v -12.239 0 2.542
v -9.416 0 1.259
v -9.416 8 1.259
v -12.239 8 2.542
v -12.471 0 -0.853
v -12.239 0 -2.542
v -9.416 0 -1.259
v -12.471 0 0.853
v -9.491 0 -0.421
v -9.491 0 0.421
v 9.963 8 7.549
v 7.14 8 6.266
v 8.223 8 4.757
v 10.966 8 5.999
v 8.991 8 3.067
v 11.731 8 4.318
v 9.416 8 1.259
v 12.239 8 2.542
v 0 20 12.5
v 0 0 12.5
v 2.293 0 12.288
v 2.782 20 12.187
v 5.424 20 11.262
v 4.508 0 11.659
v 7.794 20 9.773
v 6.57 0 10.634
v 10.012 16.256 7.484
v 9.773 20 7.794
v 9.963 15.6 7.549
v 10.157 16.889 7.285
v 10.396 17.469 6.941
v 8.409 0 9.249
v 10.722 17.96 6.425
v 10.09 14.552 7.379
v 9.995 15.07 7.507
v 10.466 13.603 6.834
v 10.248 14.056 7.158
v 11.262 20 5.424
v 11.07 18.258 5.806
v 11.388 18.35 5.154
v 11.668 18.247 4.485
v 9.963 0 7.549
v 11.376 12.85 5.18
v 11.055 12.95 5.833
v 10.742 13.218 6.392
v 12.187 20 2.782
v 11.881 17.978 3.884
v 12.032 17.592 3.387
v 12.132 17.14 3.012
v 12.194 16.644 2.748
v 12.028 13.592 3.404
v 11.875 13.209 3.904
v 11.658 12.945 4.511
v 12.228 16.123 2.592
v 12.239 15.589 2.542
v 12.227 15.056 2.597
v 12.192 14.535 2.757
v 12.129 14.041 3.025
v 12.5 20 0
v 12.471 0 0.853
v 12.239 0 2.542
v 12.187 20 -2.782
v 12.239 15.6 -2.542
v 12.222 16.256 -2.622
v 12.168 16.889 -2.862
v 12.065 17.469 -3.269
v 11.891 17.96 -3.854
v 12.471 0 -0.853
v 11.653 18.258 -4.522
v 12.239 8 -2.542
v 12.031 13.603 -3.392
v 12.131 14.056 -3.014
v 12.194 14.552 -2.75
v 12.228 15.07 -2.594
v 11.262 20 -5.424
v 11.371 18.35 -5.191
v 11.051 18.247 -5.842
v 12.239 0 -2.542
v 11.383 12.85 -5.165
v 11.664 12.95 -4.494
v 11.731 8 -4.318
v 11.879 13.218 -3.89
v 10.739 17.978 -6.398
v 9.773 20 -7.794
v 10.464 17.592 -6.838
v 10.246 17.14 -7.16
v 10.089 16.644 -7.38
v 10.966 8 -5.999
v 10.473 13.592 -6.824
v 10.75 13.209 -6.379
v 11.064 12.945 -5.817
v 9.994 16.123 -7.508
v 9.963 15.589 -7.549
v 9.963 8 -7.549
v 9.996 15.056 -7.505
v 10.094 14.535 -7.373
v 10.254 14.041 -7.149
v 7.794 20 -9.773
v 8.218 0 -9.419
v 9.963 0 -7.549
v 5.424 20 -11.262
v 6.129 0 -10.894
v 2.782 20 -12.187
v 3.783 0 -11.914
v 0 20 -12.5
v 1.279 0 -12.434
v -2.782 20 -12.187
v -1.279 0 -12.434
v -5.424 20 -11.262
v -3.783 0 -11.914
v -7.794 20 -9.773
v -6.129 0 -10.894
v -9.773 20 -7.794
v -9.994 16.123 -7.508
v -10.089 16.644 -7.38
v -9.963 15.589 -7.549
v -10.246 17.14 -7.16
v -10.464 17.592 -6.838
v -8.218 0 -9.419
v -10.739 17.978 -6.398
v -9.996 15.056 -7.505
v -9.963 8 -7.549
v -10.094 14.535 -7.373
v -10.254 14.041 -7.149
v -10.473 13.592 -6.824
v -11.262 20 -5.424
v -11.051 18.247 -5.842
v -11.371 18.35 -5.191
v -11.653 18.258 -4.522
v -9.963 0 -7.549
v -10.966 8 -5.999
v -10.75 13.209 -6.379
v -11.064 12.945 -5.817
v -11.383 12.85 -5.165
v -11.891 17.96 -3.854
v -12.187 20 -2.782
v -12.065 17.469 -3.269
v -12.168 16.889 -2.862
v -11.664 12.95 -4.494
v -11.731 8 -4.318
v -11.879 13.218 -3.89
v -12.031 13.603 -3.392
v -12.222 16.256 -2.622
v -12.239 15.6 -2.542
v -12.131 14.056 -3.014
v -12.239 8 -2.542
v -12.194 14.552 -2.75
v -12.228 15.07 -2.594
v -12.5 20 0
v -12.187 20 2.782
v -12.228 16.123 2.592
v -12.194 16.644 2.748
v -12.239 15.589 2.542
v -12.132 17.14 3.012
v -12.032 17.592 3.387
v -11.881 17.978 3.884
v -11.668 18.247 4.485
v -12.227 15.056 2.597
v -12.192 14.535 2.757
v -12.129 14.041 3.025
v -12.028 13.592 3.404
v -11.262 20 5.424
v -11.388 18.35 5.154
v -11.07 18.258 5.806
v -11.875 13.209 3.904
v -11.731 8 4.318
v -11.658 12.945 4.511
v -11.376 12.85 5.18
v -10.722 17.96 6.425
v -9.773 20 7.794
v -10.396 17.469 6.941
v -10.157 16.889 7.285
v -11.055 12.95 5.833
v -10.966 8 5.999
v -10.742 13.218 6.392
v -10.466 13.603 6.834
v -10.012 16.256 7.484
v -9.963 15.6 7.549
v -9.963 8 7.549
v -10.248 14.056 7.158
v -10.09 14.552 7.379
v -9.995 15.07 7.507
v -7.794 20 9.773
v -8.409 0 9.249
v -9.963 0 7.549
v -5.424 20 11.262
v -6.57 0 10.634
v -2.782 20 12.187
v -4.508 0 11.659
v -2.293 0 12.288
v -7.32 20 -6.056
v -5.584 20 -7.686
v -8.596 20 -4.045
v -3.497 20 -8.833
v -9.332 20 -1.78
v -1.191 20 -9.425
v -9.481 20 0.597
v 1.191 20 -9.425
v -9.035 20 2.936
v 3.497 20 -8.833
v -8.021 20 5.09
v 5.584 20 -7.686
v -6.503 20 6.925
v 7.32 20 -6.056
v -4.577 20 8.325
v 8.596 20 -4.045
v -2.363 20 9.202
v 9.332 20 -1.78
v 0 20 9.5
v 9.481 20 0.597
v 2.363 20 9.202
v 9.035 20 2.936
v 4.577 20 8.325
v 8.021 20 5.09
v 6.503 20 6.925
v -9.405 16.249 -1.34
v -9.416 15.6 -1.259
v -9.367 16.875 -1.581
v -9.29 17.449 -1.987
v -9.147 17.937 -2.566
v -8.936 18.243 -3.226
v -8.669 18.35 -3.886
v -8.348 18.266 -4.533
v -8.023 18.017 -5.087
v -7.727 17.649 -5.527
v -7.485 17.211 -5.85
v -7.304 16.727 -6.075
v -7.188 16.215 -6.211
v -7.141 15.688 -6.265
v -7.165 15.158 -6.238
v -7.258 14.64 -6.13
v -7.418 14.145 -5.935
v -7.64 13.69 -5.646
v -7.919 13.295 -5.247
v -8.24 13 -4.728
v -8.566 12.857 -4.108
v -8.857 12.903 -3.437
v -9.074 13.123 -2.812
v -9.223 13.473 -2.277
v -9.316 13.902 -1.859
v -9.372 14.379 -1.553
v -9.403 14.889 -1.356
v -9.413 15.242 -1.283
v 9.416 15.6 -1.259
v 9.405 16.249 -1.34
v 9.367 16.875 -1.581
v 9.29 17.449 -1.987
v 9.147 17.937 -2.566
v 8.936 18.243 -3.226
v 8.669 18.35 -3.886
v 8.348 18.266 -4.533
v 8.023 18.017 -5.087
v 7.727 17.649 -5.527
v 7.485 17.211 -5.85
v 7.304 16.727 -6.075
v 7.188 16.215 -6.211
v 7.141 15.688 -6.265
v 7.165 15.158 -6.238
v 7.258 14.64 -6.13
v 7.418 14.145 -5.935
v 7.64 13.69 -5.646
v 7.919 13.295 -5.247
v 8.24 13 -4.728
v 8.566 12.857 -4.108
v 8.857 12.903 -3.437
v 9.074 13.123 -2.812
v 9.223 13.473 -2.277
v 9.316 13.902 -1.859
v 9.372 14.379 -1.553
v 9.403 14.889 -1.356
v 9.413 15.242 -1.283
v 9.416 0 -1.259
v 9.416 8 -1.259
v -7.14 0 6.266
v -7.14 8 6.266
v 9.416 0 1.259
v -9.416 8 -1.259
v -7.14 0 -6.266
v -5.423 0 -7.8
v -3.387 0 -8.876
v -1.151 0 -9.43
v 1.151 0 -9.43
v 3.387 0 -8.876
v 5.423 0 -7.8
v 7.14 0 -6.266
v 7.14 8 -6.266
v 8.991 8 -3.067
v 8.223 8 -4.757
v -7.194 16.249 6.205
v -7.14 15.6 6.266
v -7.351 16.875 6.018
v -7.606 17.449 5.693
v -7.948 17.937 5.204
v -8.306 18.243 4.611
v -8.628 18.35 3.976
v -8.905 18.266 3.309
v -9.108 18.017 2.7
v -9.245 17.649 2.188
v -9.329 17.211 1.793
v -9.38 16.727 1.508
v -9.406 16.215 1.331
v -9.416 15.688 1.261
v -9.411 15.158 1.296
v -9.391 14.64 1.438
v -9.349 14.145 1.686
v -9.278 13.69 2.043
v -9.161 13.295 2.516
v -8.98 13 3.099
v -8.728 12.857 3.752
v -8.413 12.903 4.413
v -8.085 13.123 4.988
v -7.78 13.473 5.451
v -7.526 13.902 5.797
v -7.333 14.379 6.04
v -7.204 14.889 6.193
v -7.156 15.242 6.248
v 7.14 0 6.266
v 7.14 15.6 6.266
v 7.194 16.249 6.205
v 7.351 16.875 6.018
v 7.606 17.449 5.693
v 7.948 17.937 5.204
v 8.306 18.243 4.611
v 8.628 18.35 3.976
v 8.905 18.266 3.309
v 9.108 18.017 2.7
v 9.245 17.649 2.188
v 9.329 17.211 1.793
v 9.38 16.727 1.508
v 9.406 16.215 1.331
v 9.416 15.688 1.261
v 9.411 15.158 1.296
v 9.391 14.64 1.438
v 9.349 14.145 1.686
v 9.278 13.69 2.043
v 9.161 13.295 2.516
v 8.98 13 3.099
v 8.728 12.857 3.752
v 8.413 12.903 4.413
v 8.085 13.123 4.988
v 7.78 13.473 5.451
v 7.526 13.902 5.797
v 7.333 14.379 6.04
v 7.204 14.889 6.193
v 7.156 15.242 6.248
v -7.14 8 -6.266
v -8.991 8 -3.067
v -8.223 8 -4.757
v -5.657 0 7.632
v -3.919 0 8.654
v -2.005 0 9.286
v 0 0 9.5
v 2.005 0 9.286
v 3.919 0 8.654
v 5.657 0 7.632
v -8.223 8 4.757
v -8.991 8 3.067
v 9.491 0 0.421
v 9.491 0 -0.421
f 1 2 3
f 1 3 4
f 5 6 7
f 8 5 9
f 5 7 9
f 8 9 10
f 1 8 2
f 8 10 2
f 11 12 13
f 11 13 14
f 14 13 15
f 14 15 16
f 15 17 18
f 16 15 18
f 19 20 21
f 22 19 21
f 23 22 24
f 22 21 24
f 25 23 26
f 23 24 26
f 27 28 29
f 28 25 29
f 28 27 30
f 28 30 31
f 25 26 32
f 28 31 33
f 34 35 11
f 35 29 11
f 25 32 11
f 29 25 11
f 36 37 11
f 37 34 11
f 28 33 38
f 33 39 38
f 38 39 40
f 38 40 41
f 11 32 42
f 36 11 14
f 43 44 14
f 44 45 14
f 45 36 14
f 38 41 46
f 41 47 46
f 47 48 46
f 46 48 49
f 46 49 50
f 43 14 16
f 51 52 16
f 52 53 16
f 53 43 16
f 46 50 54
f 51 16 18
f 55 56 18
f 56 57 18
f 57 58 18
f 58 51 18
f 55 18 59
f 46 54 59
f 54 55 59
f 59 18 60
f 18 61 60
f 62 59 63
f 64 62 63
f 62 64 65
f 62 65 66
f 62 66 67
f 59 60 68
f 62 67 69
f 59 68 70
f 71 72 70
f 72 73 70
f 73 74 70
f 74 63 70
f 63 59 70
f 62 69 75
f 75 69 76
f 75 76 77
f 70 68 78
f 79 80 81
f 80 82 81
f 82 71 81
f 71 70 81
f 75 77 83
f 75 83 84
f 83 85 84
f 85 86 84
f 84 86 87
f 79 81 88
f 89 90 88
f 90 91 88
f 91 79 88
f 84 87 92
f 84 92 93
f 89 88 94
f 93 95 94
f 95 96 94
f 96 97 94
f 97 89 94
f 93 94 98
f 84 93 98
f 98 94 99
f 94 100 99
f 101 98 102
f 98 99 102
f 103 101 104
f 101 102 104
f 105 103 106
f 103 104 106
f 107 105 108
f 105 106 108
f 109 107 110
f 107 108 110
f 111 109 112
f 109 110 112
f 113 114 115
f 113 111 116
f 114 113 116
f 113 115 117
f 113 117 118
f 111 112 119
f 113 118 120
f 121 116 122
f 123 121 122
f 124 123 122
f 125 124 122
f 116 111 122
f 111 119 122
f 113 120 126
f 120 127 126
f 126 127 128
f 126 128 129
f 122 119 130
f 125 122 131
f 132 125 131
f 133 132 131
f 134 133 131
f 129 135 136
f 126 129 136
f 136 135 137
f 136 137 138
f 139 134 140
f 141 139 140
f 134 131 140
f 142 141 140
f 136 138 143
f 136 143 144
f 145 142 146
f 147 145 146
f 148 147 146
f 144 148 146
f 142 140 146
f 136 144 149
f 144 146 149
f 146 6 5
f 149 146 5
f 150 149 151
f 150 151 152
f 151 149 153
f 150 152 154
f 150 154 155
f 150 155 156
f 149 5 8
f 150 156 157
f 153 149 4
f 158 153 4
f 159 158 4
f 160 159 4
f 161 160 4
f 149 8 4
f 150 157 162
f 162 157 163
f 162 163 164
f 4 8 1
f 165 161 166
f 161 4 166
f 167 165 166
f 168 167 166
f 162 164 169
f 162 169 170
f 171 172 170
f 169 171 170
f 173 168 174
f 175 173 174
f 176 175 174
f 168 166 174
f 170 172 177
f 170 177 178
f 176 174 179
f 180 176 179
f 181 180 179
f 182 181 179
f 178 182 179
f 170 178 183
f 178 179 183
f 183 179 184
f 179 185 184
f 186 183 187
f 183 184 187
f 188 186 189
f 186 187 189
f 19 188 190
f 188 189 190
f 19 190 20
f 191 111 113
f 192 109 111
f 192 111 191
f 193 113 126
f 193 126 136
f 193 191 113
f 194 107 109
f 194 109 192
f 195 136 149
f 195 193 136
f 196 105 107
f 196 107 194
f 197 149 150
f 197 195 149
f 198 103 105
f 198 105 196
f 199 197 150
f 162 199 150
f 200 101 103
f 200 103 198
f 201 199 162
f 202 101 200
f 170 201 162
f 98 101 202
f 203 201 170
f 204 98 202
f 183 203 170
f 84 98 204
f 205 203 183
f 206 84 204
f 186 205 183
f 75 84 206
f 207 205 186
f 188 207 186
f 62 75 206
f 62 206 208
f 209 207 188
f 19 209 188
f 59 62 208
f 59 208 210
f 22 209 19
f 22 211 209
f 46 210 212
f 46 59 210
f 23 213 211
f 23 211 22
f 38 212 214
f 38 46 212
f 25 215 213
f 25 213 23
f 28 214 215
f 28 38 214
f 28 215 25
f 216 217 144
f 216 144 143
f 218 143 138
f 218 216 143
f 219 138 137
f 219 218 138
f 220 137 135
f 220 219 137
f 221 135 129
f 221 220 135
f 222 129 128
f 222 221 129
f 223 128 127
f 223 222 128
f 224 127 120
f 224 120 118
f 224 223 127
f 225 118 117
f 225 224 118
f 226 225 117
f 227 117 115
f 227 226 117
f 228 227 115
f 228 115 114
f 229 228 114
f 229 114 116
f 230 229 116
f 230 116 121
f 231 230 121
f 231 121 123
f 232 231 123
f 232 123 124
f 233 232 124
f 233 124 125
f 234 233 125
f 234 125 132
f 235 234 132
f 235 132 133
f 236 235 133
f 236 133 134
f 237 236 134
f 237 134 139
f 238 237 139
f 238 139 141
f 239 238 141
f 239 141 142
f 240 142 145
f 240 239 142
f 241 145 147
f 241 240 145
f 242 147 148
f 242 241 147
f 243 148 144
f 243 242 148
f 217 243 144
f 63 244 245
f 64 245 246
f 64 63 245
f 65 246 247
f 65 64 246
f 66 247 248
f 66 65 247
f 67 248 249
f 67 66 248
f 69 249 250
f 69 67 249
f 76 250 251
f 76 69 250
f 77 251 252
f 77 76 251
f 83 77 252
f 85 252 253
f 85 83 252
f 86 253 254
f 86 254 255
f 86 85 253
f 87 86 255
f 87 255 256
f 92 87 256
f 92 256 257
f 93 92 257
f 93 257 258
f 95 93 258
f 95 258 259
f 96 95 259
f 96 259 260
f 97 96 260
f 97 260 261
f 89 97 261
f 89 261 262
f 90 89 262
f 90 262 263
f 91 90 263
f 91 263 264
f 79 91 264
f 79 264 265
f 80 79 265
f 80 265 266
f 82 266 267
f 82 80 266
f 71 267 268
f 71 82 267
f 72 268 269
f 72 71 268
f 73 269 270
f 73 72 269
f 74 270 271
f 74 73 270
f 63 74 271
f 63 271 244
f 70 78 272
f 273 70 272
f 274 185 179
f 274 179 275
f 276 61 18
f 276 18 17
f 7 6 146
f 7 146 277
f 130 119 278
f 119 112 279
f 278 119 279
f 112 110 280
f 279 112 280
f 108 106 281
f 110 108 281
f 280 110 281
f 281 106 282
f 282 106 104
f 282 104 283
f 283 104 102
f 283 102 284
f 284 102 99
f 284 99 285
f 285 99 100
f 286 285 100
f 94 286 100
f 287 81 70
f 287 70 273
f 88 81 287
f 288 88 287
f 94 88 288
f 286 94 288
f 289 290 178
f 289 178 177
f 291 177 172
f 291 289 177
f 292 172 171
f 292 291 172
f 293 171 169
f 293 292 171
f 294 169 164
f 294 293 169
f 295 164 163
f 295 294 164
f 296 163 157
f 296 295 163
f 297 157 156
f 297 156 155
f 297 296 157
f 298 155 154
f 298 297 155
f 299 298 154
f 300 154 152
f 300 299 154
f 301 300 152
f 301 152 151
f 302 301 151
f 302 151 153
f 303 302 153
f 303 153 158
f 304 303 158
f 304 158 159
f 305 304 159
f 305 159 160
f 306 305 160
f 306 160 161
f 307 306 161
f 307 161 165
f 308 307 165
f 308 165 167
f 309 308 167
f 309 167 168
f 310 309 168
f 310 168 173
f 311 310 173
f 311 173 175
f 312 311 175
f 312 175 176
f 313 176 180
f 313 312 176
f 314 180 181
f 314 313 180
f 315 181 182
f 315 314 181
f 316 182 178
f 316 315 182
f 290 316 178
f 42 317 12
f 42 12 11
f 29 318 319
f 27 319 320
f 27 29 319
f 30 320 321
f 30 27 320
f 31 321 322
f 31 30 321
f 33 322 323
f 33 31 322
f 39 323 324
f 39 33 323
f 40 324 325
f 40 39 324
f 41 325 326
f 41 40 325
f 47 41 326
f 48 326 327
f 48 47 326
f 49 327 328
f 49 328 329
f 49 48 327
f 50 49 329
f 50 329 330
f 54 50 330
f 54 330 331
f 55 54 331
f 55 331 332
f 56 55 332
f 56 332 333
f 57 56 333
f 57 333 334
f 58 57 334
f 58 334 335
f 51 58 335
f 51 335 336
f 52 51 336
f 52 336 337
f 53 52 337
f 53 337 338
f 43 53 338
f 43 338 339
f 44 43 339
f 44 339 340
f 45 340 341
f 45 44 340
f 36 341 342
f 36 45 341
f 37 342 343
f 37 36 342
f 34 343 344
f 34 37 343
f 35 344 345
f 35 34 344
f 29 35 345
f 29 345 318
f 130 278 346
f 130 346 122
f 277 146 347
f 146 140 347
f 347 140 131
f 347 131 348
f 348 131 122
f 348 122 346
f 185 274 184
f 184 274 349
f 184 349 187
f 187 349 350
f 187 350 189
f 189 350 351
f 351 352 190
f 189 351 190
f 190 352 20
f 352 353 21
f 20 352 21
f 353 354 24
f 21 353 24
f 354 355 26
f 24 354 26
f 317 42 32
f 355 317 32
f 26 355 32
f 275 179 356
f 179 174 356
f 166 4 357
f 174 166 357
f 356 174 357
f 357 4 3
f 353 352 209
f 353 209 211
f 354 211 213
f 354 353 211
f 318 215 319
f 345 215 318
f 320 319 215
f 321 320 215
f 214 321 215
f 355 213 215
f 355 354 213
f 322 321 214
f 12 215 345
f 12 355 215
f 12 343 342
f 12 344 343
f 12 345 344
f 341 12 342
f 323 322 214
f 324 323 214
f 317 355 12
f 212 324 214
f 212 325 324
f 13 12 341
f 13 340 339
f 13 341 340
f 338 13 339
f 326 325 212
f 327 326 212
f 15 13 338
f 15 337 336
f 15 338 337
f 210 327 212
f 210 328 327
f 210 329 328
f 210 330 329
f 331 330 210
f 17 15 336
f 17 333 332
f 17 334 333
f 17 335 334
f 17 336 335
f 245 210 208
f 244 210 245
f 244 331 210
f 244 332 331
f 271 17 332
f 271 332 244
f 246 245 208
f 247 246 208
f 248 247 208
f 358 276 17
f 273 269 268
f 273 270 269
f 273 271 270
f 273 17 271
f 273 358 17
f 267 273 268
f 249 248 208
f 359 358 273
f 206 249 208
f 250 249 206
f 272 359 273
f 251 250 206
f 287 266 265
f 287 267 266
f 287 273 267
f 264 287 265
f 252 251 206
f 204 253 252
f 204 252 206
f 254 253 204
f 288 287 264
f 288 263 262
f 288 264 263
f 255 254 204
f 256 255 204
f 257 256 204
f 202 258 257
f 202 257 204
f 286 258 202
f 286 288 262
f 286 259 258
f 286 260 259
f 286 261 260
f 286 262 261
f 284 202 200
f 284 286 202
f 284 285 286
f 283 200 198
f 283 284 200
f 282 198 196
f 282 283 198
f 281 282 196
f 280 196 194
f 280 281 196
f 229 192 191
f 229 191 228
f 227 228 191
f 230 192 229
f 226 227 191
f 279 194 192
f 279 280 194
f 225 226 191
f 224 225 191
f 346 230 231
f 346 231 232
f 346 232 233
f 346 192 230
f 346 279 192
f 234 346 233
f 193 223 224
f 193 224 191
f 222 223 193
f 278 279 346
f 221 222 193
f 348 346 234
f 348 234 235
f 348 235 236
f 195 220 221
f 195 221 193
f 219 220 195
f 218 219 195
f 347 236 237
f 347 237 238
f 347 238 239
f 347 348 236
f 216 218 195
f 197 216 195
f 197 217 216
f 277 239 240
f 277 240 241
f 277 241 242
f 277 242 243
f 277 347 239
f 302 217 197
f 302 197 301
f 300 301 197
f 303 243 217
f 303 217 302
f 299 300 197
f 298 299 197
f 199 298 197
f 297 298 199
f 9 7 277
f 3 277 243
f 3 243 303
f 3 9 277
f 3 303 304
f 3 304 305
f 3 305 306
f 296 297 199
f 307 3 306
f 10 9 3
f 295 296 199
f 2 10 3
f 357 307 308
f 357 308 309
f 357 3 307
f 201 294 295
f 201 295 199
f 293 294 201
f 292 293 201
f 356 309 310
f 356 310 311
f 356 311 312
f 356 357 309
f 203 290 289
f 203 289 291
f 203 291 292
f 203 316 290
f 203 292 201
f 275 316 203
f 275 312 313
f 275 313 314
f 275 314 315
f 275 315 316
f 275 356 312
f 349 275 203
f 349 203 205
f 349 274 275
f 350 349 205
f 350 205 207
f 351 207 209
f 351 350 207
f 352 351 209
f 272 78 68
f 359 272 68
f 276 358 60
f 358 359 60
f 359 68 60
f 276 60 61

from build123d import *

# Parameters (mm, degrees)
SKETCH1_R               = 12.5
SKETCH1_R_2             = 9.5
BOSS_EXTRUDE1_DEPTH     = 20
CUT_EXTRUDE1_DEPTH      = 25.498499593
CUT_EXTRUDE1_DEPTH_BACK = 25.498499593
SKETCH2_R               = 2.75
CUT_EXTRUDE2_DEPTH      = 41.591596454
CUT_EXTRUDE2_DEPTH_BACK = 41.591596454
SKETCH3_R               = 2.75
CUT_EXTRUDE3_DEPTH      = 8


with BuildPart() as part:
    # Sketch1 → Boss-Extrude1 (new body)
    with BuildSketch(Plane(origin=(0, 0, 0), x_dir=(1, 0, 0), z_dir=(0, 1, 0))):
        with Locations(Location((0, 0, 0), (0, 0, 270))):
            Circle(SKETCH1_R)
        with Locations(Location((0, 0, 0), (0, 0, 270))):
            Circle(SKETCH1_R_2, mode=Mode.SUBTRACT)
    extrude(amount=BOSS_EXTRUDE1_DEPTH)

    # Sketch2 → Cut-Extrude1 (cut, two sides: drawn at the far end of the back side and taken through both)
    with BuildSketch(Plane(origin=(0, 3.038971661, 0), x_dir=(0.41379310344827586, 0, 0.9103709505133852), z_dir=(-0.9103709505133852, 0, 0.41379310344827586)).offset(-CUT_EXTRUDE1_DEPTH_BACK)):
        with Locations((0, 12.561028339)):
            Circle(SKETCH2_R)
    extrude(amount=CUT_EXTRUDE1_DEPTH + CUT_EXTRUDE1_DEPTH_BACK, mode=Mode.SUBTRACT)

    # Sketch3 → Cut-Extrude2 (cut, two sides: drawn at the far end of the back side and taken through both)
    with BuildSketch(Plane(origin=(-18.02534482, 3.038971661, -8.193103448), x_dir=(-0.41379310344827586, 0, 0.9103709505133852), z_dir=(-0.9103709505133852, 0, -0.41379310344827586)).offset(-CUT_EXTRUDE2_DEPTH_BACK)):
        with Locations((0, 12.561028339)):
            Circle(SKETCH3_R)
    extrude(amount=CUT_EXTRUDE2_DEPTH + CUT_EXTRUDE2_DEPTH_BACK, mode=Mode.SUBTRACT)

    # Sketch6 → Cut-Extrude3 (cut)
    with BuildSketch(Plane(origin=(0, 0, 0), x_dir=(1, 0, 0), z_dir=(0, 1, 0))):
        with BuildLine():
            Line((-9.962903285, -7.549209106), (-7.140314851, -6.266251179))
            ThreePointArc((-7.140314851, -6.266251179), (-8.64852403, -3.931034483), (-9.41617692, -1.259210951))
            Line((-9.41617692, -1.259210951), (-12.238765354, -2.542168878))
            ThreePointArc((-12.238765354, -2.542168878), (-11.379636881, -5.172413793), (-9.962903285, -7.549209106))
        make_face()
        with BuildLine():
            Line((-12.238765354, 2.542168878), (-9.41617692, 1.259210951))
            ThreePointArc((-9.41617692, 1.259210951), (-8.64852403, 3.931034483), (-7.140314851, 6.266251179))
            Line((-7.140314851, 6.266251179), (-9.962903285, 7.549209106))
            ThreePointArc((-9.962903285, 7.549209106), (-11.379636881, 5.172413793), (-12.238765354, 2.542168878))
        make_face()
        with BuildLine():
            Line((7.140314851, 6.266251179), (9.962903285, 7.549209106))
            ThreePointArc((9.962903285, 7.549209106), (11.379636881, 5.172413793), (12.238765354, 2.542168878))
            Line((12.238765354, 2.542168878), (9.41617692, 1.259210951))
            ThreePointArc((9.41617692, 1.259210951), (8.64852403, 3.931034483), (7.140314851, 6.266251179))
        make_face()
        with BuildLine():
            Line((7.140314851, -6.266251179), (9.962903285, -7.549209106))
            ThreePointArc((9.962903285, -7.549209106), (11.379636881, -5.172413793), (12.238765354, -2.542168878))
            Line((12.238765354, -2.542168878), (9.41617692, -1.259210951))
            ThreePointArc((9.41617692, -1.259210951), (8.64852403, -3.931034483), (7.140314851, -6.266251179))
        make_face()
    extrude(amount=CUT_EXTRUDE3_DEPTH, mode=Mode.SUBTRACT)


solid = part.part
